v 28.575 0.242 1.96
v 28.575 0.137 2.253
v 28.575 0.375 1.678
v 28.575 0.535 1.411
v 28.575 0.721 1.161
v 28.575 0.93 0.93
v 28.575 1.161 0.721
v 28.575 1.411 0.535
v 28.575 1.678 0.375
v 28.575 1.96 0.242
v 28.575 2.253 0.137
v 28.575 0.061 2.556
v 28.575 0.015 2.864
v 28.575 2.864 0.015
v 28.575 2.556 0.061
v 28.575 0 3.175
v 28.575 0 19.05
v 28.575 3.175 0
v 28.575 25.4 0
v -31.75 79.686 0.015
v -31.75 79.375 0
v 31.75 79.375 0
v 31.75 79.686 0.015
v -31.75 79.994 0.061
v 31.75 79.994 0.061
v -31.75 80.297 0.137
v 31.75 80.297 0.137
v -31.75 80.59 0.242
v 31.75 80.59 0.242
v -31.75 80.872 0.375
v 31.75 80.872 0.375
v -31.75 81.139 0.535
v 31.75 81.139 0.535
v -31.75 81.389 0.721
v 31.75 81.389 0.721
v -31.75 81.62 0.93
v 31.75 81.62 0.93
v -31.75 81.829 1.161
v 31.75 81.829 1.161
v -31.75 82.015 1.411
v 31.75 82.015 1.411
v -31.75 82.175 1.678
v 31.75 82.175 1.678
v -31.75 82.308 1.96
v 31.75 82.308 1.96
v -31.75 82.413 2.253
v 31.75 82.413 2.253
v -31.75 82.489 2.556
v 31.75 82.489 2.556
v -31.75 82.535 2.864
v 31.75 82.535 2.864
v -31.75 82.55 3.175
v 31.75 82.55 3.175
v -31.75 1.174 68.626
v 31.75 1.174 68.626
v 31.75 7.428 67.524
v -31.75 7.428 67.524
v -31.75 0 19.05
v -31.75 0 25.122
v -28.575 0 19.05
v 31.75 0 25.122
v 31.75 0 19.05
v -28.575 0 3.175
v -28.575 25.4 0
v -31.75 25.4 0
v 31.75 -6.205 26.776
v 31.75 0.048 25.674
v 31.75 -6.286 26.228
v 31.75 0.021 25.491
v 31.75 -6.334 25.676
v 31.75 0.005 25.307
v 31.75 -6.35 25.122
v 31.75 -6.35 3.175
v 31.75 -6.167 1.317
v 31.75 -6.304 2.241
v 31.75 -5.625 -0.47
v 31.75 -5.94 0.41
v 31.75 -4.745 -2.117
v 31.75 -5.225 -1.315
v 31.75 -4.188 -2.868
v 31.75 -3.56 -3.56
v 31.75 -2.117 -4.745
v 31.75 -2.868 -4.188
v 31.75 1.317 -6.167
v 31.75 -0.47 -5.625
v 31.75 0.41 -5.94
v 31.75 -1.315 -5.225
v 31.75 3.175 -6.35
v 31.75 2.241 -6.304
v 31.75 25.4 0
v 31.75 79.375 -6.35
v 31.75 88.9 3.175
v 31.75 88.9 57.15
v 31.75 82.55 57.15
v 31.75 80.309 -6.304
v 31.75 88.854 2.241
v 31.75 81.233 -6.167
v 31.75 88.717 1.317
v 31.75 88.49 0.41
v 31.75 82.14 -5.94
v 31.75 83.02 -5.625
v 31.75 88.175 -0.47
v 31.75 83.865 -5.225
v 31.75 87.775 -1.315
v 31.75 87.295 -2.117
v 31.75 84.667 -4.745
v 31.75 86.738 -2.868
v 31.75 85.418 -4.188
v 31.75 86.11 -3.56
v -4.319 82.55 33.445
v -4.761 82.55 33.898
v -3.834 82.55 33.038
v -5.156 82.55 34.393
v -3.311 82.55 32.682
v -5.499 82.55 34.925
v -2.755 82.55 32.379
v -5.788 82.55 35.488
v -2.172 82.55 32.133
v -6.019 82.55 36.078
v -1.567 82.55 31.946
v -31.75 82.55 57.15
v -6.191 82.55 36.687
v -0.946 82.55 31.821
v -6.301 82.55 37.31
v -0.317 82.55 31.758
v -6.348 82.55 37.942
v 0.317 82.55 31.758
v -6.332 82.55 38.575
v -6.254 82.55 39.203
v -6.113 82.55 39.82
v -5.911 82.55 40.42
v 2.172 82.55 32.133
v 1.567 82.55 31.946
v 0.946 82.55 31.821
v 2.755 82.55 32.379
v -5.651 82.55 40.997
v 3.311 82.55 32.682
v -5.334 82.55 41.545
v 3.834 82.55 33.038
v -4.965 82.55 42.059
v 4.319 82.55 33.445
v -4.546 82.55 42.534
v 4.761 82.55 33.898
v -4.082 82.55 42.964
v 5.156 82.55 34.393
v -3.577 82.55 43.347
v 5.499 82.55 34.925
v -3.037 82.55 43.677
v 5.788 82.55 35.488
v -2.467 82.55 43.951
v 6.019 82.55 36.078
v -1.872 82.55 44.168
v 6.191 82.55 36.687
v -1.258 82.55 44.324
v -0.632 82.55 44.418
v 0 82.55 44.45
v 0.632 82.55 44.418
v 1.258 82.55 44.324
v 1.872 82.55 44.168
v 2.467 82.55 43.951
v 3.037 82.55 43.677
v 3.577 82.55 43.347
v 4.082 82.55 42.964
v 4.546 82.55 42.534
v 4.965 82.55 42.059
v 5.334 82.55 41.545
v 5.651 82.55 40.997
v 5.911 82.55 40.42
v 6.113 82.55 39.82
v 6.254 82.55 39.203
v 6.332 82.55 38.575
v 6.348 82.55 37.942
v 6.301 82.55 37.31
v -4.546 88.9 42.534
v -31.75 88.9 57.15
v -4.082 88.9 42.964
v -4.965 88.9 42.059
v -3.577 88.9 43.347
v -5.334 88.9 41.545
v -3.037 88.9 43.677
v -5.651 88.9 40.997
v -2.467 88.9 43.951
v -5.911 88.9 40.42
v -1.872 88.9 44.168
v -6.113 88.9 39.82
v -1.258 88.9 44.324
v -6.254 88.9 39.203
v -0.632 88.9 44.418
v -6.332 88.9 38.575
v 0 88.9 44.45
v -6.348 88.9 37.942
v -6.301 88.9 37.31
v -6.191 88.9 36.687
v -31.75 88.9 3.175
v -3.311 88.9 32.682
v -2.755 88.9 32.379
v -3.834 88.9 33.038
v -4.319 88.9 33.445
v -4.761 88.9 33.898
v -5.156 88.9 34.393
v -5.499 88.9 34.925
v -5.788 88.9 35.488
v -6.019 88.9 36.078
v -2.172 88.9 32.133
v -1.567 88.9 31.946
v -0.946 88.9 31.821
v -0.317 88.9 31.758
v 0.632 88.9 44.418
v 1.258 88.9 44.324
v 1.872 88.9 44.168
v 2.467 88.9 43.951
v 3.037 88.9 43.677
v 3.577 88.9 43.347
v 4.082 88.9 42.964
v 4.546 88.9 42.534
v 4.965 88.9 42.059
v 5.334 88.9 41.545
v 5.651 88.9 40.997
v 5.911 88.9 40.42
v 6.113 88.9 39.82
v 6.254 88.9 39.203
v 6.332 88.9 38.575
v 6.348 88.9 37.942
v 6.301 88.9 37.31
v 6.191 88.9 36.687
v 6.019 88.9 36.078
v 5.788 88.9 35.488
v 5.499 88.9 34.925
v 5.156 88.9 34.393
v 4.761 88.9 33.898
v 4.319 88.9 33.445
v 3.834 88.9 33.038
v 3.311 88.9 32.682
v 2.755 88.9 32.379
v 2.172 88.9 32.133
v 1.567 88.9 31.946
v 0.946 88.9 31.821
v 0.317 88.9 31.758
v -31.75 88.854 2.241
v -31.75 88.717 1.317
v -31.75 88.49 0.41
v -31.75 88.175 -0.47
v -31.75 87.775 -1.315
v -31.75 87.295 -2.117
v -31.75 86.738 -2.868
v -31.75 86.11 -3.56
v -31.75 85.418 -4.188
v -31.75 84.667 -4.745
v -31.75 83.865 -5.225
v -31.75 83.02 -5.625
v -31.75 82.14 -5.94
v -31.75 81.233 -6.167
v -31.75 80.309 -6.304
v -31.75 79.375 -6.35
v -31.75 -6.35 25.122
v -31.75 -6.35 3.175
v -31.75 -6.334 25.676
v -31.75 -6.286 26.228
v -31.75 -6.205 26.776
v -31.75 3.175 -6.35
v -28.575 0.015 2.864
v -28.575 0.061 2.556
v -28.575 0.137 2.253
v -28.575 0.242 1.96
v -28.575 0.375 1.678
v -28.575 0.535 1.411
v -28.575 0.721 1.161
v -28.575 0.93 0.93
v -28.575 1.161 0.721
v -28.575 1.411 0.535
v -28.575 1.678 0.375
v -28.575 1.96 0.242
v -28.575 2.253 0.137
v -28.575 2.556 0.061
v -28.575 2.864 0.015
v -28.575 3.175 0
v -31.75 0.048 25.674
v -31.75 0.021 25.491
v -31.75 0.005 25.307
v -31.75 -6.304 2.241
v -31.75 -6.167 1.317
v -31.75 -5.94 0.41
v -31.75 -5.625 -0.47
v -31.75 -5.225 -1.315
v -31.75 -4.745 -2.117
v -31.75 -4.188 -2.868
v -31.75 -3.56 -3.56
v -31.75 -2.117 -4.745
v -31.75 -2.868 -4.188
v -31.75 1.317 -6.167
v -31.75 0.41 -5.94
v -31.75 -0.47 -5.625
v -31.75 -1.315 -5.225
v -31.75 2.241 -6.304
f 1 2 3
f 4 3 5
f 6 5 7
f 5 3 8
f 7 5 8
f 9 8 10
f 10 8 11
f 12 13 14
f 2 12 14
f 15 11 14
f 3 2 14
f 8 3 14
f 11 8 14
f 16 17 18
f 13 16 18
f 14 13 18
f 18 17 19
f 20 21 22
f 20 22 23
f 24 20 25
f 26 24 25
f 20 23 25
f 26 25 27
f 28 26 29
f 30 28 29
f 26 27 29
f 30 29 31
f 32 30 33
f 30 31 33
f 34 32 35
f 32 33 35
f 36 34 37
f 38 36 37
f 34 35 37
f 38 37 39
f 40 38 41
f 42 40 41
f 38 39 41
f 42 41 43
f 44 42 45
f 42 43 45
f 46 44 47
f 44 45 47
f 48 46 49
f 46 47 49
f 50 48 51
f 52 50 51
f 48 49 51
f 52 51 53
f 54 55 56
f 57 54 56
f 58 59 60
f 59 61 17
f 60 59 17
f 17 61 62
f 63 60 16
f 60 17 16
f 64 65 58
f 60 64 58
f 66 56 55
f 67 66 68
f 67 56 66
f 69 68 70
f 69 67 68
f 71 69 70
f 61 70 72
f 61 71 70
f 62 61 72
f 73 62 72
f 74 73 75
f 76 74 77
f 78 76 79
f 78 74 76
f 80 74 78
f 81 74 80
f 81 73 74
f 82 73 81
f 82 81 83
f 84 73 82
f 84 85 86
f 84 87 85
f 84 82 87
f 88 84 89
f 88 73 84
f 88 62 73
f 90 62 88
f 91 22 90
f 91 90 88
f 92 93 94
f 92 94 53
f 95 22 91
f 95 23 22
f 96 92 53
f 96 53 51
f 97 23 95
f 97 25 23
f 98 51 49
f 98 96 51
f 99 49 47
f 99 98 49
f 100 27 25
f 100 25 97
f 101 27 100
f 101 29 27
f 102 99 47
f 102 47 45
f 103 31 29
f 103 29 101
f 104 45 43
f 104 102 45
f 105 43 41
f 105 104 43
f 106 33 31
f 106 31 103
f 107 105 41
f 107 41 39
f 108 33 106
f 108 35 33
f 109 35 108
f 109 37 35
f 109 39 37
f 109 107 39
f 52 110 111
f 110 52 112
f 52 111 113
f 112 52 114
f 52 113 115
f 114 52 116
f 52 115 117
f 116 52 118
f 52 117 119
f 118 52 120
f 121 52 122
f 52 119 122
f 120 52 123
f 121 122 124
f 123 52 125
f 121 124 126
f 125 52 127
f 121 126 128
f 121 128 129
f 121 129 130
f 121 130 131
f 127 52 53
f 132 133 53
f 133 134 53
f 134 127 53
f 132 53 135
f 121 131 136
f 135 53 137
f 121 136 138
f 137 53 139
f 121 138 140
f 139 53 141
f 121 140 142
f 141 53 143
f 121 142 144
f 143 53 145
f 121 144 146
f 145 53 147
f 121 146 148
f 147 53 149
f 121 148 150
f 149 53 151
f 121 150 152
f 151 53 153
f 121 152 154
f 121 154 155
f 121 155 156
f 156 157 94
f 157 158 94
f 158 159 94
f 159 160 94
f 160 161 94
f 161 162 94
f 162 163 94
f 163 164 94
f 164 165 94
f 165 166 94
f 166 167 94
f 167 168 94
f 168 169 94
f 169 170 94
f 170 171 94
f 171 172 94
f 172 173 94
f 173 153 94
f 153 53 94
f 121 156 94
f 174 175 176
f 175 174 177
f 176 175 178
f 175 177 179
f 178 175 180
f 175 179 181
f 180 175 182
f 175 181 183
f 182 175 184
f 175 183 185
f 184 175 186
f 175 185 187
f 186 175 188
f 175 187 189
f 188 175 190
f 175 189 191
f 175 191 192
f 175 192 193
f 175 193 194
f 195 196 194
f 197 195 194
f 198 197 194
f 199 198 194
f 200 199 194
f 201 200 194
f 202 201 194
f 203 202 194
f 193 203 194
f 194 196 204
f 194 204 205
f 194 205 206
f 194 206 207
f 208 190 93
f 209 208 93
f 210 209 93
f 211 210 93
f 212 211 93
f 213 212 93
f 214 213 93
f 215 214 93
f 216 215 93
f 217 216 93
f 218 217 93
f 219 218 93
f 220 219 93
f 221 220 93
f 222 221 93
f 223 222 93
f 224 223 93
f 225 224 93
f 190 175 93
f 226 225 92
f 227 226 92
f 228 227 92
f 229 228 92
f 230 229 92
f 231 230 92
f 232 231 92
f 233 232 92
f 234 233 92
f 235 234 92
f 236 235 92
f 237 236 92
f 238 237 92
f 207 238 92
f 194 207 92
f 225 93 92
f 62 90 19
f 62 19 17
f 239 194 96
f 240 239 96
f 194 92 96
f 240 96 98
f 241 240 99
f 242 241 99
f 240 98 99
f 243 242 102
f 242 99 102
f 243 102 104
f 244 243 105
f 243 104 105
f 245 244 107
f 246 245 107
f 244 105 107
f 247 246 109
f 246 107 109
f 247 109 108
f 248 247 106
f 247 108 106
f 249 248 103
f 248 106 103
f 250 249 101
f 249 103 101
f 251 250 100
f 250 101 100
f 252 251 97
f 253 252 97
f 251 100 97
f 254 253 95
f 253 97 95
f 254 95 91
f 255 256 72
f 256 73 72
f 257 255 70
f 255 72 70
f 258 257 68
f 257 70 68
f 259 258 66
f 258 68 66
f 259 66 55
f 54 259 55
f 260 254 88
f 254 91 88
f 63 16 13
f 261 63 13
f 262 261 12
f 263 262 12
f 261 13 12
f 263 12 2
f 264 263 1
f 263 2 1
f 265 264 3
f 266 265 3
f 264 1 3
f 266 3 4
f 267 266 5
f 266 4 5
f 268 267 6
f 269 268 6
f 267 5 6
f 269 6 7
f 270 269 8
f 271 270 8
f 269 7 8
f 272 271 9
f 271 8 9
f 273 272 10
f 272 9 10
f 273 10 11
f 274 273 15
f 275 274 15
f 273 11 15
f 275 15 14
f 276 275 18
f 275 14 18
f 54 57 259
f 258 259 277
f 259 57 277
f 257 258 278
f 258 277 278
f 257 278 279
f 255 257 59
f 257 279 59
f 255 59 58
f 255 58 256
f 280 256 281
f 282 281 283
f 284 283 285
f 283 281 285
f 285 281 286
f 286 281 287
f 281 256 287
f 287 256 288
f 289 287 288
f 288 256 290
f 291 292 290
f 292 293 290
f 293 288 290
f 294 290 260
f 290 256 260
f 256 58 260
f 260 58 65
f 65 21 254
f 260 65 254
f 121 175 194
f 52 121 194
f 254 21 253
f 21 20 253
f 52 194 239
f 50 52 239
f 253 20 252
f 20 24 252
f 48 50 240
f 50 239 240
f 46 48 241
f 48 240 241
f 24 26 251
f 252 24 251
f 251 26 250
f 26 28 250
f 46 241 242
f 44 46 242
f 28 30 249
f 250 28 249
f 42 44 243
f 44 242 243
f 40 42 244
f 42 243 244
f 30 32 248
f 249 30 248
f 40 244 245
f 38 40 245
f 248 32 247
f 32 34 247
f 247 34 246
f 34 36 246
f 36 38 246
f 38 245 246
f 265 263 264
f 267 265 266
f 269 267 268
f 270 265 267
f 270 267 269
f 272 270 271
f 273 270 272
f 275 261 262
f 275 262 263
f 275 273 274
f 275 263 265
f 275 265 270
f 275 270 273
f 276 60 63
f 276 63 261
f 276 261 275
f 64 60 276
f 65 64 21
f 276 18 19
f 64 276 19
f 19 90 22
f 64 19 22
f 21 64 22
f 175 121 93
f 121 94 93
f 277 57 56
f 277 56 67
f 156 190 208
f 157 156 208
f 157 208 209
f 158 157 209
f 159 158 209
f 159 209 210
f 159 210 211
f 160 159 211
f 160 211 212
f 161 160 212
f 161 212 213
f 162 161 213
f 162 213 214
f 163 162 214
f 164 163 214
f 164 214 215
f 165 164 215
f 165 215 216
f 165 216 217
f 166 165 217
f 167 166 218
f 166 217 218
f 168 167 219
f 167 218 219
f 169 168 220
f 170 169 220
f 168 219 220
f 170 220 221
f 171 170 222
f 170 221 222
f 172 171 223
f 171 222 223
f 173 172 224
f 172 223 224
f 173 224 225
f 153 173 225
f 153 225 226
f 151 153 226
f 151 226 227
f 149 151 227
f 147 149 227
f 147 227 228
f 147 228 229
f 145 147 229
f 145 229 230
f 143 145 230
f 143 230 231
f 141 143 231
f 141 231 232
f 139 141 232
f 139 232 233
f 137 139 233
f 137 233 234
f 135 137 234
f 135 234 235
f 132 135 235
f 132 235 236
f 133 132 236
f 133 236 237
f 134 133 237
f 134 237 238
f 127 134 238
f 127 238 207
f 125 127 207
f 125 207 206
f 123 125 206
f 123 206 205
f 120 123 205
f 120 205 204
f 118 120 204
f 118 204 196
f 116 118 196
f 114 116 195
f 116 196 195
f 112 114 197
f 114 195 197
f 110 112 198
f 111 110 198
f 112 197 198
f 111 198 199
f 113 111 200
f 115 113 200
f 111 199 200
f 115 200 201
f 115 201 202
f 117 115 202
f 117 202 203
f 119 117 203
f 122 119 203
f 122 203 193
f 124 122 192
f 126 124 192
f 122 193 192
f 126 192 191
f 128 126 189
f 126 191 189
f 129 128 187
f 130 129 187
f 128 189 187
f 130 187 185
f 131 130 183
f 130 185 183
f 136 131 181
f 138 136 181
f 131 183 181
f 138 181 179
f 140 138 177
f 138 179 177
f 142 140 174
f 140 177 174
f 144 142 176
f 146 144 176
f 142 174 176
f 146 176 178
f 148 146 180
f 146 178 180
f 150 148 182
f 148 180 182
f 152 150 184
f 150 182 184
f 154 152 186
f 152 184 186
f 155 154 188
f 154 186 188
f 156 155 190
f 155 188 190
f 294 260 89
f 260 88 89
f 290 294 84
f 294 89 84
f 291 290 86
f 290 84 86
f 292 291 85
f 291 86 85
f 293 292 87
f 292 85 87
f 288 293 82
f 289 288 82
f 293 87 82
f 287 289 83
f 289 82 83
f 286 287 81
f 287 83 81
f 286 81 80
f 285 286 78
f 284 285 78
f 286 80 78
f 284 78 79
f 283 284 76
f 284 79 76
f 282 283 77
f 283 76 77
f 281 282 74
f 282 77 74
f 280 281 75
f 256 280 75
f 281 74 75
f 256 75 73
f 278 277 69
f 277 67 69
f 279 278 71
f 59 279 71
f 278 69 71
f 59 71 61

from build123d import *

# Parameters (mm, degrees)
BASE_EXTRUDE_THIN_DEPTH = 31.75
CUT_EXTRUDE1_REACH      = 123.615
SKETCH2_R               = 6.35
BOSS_EXTRUDE1_DEPTH     = 3.175


with BuildPart() as part:
    # Sketch1 → Base-Extrude-Thin (new, symmetric)
    with BuildSketch(Plane(origin=(0, 0, 0), x_dir=(0, 0, -1), z_dir=(1, 0, 0))):
        with BuildLine():
            Line((-67.523772904, 7.427557692), (-25.673556457, 0.048235384))
            ThreePointArc((-25.673556457, 0.048235384), (-25.398942977, 0.012081834), (-25.122223493, 0))
            Line((-25.122223493, 0), (-3.175, 0))
            ThreePointArc((-3.175, 0), (-0.92993597, 0.92993597), (0, 3.175))
            Line((0, 3.175), (0, 79.375))
            ThreePointArc((0, 79.375), (-0.92993597, 81.62006403), (-3.175, 82.55))
            Line((-3.175, 82.55), (-57.15, 82.55))
            Line((-57.15, 82.55), (-57.15, 88.9))
            Line((-57.15, 88.9), (-3.175, 88.9))
            ThreePointArc((-3.175, 88.9), (3.560192091, 86.110192091), (6.35, 79.375))
            Line((6.35, 79.375), (6.35, 3.175))
            ThreePointArc((6.35, 3.175), (3.560192091, -3.560192091), (-3.175, -6.35))
            Line((-3.175, -6.35), (-25.122223493, -6.35))
            ThreePointArc((-25.122223493, -6.35), (-25.952381943, -6.313754499), (-26.776222386, -6.205293847))
            Line((-26.776222386, -6.205293847), (-68.626438832, 1.174028461))
            Line((-68.626438832, 1.174028461), (-67.523772904, 7.427557692))
        make_face()
    extrude(amount=BASE_EXTRUDE_THIN_DEPTH, both=True)

    # Sketch2 → Cut-Extrude1 (cut, up to next)
    with BuildSketch(Plane(origin=(0, 88.9, 0), x_dir=(-1, 0, 0), z_dir=(0, 1, 0)), mode=Mode.PRIVATE) as cut_extrude1_sk1:
        with Locations(Location((0, 38.1, 0), (0, 0, 90))):
            Circle(SKETCH2_R)
    cut_extrude1_tool1 = extrude(cut_extrude1_sk1.sketch, amount=-CUT_EXTRUDE1_REACH, mode=Mode.PRIVATE) & part.part
    add(cut_extrude1_tool1.solids().sort_by_distance((0, 88.9, 38.1))[0], mode=Mode.SUBTRACT)

    # Sketch3 → Boss-Extrude1 (add)
    with BuildSketch(Plane(origin=(31.75, 0, 0), x_dir=(0, 0, -1), z_dir=(1, 0, 0))):
        with BuildLine():
            Line((-19.05, 0), (-3.175, 0))
            ThreePointArc((-3.175, 0), (-0.92993597, 0.92993597), (0, 3.175))
            Line((0, 3.175), (0, 25.4))
            Line((0, 25.4), (-19.05, 0))
        make_face()
    boss_extrude1 = extrude(amount=-BOSS_EXTRUDE1_DEPTH)

    # Mirror1: Boss-Extrude1 across plane
    add(boss_extrude1.mirror(Plane(origin=(0, 0, 0), x_dir=(0, 0, 1), z_dir=(1, 0, 0))))


solid = part.part
